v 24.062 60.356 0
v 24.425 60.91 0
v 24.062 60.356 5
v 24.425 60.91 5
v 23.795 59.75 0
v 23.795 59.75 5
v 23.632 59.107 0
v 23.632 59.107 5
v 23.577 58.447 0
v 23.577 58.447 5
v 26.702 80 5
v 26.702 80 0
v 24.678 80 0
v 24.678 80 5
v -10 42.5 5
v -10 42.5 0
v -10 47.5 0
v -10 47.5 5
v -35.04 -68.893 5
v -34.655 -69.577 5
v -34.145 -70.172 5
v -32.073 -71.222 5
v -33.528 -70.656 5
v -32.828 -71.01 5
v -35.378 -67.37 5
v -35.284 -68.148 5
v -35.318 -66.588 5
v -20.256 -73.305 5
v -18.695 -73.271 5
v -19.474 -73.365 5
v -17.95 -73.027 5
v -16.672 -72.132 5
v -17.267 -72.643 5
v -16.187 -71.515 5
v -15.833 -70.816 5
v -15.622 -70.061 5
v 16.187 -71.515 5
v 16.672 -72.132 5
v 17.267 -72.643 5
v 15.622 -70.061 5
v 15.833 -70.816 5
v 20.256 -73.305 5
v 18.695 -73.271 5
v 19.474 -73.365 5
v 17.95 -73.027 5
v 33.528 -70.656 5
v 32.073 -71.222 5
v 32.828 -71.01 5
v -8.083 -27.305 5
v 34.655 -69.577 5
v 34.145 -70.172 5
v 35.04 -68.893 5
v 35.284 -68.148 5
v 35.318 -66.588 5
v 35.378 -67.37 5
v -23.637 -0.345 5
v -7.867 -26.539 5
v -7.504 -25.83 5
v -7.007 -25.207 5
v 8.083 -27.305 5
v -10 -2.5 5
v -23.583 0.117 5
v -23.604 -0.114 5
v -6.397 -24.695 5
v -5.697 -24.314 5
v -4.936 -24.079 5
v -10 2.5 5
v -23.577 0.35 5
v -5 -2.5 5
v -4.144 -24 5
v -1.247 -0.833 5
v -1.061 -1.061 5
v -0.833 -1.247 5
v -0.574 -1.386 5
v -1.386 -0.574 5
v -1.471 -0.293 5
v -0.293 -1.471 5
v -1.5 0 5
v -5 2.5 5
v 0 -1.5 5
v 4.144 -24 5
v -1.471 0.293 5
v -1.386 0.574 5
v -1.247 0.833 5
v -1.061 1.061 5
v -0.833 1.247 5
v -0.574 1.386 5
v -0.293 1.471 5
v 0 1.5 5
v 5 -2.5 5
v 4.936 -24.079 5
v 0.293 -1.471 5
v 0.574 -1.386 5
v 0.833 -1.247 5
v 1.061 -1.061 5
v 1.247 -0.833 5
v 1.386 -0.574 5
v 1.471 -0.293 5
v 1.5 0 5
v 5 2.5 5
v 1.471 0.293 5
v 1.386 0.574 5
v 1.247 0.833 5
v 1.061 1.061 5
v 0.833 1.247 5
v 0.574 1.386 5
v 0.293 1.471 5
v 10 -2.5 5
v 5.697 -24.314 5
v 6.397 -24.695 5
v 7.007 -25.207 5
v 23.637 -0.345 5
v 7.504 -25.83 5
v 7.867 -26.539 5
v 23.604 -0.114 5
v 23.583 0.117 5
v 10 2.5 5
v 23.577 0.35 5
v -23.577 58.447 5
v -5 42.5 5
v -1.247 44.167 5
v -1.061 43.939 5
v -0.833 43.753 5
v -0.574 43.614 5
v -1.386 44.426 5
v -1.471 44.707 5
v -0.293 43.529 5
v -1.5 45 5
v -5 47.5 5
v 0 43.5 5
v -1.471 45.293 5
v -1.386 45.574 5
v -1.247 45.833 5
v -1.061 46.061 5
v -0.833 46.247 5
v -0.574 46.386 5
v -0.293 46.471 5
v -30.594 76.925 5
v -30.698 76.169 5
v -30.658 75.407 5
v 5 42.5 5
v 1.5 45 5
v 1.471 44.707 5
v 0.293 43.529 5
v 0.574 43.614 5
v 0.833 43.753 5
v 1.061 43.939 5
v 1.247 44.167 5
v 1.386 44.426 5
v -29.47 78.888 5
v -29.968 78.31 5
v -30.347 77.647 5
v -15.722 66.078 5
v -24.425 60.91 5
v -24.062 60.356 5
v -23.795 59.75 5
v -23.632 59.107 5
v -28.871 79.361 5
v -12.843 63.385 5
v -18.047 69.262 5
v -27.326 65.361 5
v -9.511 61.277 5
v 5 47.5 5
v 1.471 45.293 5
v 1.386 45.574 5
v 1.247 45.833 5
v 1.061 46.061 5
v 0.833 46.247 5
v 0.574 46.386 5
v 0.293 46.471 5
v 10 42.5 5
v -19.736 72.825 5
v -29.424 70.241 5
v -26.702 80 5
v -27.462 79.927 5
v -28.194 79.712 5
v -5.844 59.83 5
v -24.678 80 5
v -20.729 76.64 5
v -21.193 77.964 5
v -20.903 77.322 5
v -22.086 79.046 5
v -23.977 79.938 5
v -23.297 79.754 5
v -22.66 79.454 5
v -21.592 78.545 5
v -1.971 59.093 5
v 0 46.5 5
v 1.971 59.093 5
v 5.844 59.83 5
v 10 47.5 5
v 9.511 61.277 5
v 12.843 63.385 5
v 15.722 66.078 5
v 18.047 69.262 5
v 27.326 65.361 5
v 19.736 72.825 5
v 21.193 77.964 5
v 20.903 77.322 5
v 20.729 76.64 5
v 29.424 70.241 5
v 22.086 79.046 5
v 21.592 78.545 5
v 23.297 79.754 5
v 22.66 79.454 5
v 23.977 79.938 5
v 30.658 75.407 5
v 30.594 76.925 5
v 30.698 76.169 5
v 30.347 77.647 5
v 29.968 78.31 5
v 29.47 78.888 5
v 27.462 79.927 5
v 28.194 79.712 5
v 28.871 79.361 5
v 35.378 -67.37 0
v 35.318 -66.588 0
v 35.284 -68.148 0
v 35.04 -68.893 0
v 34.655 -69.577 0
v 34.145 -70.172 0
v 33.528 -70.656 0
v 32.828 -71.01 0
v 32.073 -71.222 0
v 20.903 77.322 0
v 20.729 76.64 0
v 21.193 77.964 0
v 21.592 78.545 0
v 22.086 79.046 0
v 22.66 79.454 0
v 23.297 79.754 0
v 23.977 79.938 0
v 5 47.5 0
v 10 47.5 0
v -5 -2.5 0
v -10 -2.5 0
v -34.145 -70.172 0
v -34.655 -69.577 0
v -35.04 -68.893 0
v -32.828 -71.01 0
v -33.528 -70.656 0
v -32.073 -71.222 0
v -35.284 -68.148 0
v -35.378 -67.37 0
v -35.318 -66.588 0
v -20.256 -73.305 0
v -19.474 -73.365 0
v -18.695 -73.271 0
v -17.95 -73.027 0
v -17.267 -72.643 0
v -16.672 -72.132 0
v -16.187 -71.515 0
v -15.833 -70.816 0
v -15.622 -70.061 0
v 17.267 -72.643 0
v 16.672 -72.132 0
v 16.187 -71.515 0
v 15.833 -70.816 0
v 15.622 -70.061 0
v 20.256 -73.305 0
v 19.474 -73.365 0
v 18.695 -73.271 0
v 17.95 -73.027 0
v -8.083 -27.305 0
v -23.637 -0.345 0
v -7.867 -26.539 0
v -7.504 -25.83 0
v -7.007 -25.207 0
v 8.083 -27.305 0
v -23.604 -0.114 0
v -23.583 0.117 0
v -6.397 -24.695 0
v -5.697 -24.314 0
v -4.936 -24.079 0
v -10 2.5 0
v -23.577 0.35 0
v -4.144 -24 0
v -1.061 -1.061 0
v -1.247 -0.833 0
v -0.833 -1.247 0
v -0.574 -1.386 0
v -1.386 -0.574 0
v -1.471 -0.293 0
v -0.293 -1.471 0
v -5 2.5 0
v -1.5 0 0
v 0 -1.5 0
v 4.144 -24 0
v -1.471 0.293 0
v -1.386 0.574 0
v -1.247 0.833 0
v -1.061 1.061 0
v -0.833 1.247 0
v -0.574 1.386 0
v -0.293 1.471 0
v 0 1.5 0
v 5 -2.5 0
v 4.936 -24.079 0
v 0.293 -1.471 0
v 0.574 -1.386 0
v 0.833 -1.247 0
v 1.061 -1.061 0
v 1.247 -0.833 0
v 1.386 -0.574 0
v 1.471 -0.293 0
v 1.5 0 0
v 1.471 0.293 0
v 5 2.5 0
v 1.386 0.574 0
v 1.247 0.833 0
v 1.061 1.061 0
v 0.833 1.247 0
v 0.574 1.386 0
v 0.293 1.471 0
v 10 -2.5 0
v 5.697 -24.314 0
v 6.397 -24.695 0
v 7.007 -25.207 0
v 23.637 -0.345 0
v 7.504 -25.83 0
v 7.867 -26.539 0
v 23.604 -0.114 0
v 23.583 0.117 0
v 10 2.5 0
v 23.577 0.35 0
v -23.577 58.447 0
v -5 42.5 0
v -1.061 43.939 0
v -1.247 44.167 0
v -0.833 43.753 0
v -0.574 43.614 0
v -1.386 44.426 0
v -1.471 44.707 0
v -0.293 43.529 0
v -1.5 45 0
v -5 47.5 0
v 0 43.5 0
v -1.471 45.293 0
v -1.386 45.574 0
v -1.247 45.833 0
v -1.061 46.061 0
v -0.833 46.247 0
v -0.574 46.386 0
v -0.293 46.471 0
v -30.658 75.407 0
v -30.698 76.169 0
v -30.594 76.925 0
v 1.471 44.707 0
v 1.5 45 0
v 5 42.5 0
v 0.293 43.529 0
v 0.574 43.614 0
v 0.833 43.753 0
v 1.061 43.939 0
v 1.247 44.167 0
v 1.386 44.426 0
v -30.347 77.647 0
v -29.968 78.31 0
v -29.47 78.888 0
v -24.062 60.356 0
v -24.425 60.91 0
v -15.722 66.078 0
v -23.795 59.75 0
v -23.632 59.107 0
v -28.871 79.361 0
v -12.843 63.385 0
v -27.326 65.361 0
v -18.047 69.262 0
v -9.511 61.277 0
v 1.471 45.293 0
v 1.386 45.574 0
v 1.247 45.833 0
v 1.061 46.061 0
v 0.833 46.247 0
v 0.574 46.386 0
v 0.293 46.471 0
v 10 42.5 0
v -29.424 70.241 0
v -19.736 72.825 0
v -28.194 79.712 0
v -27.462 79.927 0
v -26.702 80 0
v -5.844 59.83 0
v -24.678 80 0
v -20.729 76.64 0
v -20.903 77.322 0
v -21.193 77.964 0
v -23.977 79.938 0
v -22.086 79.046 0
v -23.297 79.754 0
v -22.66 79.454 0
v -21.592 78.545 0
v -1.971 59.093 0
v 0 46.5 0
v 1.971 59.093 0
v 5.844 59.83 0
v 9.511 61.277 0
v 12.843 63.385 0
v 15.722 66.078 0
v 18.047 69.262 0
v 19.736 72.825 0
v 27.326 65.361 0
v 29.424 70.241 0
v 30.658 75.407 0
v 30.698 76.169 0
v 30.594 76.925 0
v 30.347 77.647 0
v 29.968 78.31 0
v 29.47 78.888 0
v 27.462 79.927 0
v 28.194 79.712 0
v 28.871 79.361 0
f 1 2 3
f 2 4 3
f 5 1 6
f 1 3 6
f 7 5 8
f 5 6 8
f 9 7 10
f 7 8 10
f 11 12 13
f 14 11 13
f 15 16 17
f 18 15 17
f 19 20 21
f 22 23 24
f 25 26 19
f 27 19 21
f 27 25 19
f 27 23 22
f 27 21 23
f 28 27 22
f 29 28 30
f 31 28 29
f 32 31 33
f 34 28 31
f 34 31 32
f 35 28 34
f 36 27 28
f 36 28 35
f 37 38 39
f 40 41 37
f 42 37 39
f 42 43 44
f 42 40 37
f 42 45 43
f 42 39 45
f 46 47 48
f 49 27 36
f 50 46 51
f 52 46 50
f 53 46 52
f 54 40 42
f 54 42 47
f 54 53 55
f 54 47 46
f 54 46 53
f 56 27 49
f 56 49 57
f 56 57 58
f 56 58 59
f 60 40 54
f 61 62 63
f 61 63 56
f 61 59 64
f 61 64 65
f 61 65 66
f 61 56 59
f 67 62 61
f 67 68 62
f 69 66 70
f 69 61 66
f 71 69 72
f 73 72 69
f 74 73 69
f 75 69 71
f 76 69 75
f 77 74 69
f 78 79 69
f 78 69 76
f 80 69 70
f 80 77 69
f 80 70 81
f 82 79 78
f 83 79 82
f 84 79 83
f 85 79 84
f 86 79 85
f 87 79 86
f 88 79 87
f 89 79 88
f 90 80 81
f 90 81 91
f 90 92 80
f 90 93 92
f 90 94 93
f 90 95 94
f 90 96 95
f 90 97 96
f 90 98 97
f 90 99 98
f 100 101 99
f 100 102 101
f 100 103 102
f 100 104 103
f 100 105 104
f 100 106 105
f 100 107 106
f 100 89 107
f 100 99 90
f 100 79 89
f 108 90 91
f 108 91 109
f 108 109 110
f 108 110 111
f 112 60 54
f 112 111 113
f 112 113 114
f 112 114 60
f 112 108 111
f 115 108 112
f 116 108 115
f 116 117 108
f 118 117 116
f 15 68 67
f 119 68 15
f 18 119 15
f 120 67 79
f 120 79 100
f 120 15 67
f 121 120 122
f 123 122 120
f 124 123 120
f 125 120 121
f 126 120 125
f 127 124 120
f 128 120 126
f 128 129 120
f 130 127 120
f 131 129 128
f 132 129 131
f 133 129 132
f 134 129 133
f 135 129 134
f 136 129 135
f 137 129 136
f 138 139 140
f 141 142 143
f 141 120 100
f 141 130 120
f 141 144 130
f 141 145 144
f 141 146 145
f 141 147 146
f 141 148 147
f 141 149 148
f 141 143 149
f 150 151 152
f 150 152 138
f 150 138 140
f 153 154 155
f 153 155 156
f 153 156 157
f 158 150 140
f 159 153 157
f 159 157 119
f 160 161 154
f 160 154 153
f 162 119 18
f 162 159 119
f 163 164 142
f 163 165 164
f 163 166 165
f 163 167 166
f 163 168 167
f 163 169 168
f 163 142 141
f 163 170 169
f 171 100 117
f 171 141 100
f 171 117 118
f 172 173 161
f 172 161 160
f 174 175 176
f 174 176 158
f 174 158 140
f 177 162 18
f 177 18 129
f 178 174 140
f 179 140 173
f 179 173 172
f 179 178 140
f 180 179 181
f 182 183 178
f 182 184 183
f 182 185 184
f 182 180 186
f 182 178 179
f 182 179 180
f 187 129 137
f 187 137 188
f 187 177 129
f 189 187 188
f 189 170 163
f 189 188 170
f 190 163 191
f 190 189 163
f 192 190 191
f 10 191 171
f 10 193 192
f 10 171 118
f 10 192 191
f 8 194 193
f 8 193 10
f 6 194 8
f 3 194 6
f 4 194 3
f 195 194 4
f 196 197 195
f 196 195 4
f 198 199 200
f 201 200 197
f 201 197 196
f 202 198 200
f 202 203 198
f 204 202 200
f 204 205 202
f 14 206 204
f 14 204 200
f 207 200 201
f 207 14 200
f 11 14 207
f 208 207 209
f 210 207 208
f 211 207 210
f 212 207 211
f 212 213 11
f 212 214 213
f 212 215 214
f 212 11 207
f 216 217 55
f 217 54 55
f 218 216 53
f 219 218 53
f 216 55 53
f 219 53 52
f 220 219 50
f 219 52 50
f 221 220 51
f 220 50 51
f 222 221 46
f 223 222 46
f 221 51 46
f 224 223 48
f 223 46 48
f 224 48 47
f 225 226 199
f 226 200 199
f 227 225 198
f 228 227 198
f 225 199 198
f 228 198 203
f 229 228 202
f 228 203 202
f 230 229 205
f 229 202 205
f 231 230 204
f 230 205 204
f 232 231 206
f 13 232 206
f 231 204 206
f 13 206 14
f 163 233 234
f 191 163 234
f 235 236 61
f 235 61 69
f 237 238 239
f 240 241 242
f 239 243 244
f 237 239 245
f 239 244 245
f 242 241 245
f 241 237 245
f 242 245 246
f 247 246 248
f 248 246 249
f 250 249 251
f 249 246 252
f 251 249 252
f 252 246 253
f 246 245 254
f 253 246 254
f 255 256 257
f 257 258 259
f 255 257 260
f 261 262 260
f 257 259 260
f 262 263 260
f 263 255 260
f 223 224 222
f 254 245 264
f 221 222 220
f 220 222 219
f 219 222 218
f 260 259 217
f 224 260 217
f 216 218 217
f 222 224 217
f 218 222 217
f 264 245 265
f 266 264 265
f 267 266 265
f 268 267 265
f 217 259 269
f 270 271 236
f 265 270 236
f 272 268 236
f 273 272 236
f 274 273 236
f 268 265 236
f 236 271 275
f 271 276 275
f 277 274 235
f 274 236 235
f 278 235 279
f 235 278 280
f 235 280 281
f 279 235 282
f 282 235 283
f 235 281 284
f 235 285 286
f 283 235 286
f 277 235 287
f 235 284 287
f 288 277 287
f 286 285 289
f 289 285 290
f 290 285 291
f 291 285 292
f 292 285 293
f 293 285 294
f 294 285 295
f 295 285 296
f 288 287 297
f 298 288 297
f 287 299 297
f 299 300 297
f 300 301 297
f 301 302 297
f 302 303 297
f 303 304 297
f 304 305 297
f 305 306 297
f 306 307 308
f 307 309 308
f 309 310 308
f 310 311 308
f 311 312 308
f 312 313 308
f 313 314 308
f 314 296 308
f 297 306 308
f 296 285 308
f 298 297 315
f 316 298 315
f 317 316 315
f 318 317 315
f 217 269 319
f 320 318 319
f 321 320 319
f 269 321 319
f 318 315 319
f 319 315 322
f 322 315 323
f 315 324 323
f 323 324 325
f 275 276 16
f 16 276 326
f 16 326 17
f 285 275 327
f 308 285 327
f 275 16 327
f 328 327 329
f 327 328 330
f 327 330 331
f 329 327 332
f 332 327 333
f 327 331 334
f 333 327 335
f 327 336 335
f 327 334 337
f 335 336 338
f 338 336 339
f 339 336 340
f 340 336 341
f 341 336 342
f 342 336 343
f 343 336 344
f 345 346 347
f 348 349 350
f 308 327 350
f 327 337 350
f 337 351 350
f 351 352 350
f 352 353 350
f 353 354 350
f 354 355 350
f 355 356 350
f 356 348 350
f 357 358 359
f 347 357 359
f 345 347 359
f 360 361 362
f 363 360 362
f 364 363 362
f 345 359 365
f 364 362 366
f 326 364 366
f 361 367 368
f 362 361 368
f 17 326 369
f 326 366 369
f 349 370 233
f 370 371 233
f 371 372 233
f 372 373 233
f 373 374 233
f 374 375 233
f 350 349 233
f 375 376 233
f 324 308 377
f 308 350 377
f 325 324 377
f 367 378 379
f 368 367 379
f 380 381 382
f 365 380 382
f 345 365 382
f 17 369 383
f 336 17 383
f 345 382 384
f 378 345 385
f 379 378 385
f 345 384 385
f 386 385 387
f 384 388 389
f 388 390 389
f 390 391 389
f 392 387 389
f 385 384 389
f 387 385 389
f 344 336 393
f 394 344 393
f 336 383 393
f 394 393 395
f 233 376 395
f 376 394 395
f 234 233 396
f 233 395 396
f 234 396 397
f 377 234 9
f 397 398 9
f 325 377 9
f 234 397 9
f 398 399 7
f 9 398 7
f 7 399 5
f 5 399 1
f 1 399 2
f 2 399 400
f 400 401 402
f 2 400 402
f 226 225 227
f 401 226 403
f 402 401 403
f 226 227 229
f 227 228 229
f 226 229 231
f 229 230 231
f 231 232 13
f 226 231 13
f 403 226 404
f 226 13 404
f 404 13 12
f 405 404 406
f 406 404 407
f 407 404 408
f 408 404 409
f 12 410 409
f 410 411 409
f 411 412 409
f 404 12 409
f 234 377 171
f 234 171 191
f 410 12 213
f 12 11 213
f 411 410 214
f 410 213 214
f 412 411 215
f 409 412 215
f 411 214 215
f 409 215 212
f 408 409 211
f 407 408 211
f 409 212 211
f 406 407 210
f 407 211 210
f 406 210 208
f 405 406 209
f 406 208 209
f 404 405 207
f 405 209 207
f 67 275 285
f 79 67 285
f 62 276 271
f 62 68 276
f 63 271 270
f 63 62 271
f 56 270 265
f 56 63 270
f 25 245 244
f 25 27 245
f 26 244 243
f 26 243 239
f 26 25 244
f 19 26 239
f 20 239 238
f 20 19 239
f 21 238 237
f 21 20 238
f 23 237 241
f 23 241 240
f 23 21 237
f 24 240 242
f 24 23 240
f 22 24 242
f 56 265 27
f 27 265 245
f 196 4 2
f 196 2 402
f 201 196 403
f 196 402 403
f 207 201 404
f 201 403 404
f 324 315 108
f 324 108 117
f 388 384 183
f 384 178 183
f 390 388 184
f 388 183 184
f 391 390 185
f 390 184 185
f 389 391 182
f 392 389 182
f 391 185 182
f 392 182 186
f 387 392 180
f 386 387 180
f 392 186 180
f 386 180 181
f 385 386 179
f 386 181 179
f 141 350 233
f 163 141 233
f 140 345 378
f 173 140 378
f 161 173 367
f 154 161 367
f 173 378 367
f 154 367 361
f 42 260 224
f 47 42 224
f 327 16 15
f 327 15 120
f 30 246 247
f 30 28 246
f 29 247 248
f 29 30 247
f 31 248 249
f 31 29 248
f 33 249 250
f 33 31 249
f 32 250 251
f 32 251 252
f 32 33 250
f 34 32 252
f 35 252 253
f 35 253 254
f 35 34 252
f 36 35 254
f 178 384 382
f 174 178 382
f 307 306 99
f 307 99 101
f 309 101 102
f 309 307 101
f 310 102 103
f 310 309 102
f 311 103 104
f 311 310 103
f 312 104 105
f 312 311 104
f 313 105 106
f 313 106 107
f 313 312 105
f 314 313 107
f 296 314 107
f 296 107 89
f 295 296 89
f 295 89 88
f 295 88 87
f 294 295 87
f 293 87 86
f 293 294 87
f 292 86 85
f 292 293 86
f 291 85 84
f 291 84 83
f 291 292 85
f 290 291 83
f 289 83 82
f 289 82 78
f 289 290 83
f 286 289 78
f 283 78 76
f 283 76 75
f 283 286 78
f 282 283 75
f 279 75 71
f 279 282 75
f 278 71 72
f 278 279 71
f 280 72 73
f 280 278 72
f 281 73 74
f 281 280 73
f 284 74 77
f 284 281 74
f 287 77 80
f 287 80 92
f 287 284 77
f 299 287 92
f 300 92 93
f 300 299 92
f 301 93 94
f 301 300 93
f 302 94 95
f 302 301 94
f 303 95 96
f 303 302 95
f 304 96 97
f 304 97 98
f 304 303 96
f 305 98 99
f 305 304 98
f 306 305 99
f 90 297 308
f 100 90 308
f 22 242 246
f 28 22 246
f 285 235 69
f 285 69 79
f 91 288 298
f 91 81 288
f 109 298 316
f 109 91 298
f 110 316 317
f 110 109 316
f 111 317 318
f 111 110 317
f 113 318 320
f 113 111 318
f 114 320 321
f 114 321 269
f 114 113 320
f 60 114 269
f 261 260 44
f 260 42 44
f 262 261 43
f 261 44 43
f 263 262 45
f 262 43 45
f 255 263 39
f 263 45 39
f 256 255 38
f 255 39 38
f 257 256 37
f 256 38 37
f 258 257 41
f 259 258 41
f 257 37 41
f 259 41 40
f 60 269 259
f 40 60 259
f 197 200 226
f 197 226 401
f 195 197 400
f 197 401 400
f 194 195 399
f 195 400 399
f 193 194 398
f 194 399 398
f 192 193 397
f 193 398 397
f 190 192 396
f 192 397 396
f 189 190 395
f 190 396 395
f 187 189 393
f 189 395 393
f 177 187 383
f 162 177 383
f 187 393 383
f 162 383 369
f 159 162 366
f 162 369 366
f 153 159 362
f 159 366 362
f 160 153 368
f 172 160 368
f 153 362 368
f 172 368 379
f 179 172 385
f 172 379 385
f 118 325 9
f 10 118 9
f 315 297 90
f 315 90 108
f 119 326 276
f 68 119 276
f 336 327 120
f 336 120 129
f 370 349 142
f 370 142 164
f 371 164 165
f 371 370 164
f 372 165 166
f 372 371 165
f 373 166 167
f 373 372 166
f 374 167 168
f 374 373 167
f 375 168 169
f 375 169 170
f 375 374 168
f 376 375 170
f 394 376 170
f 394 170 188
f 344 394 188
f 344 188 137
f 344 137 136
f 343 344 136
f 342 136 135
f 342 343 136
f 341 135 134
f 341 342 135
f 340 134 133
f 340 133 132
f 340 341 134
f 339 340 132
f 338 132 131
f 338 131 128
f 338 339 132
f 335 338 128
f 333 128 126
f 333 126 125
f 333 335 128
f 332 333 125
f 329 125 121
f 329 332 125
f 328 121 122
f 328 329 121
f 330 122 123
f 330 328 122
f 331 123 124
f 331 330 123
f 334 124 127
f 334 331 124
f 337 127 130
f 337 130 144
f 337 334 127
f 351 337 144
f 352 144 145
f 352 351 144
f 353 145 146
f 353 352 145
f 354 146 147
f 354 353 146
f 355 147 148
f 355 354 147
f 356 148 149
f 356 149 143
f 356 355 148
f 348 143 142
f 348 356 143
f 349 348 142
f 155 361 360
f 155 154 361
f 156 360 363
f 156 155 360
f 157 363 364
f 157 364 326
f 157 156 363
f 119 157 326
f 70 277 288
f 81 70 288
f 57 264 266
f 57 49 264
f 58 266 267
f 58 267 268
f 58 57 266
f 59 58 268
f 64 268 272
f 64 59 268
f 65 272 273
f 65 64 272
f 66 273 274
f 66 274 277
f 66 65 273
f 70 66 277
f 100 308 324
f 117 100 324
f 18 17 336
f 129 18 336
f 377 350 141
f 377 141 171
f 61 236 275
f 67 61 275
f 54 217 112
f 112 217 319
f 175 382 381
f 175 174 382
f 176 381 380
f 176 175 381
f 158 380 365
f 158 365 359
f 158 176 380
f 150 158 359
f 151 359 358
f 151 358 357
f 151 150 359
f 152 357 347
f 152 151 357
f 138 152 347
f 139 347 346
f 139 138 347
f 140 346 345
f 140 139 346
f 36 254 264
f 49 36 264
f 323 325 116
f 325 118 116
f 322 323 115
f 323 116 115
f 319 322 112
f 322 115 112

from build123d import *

# Parameters (mm, degrees)
SKETCH1_R           = 1.5
SKETCH1_W           = 5
SKETCH1_H           = 5
BOSS_EXTRUDE1_DEPTH = 5
FILLET1_R           = 4


with BuildPart() as part:
    # Sketch1 → Boss-Extrude1 (new body)
    with BuildSketch(Plane.XY):
        with BuildLine():
            Line((-21, 80), (-31, 80))
            ThreePointArc((-31, 80), (-29.085023859, 69.273332897), (-23.576684701, 59.871911702))
            Line((-23.576684701, 59.871911702), (-23.576684701, 0))
            Line((-23.576684701, 0), (-36.012504096, -70.527036447))
            Line((-36.012504096, -70.527036447), (-16.316349035, -74))
            Line((-16.316349035, -74), (-7.5, -24))
            Line((-7.5, -24), (7.5, -24))
            Line((7.5, -24), (16.316349035, -74))
            Line((16.316349035, -74), (36.012504096, -70.527036447))
            Line((36.012504096, -70.527036447), (23.576684701, 0))
            Line((23.576684701, 0), (23.576684701, 59.871911702))
            ThreePointArc((23.576684701, 59.871911702), (29.085023859, 69.273332897), (31, 80))
            Line((31, 80), (21, 80))
            ThreePointArc((21, 80), (0, 59), (-21, 80))
        make_face()
        Circle(SKETCH1_R, mode=Mode.SUBTRACT)
        with Locations((0, 45)):
            Circle(SKETCH1_R, mode=Mode.SUBTRACT)
        with Locations((-7.5, 0)):
            Rectangle(SKETCH1_W, SKETCH1_H, mode=Mode.SUBTRACT)
        with Locations((7.5, 0)):
            Rectangle(SKETCH1_W, SKETCH1_H, mode=Mode.SUBTRACT)
        with Locations((-7.5, 45)):
            Rectangle(SKETCH1_W, SKETCH1_H, mode=Mode.SUBTRACT)
        with Locations((7.5, 45)):
            Rectangle(SKETCH1_W, SKETCH1_H, mode=Mode.SUBTRACT)
    extrude(amount=BOSS_EXTRUDE1_DEPTH)

    # Fillet1
    fillet1_edges = [part.edges().sort_by_distance(p)[0] for p in [
        (21, 80, 2.5),
        (31, 80, 2.5),
        (23.576684701, 59.871911702, 2.5),
        (23.576684701, 0, 2.5),
        (36.012504096, -70.527036447, 2.5),
        (16.316349035, -74, 2.5),
        (7.5, -24, 2.5),
        (-7.5, -24, 2.5),
        (-16.316349035, -74, 2.5),
        (-36.012504096, -70.527036447, 2.5),
        (-23.576684701, 0, 2.5),
        (-23.576684701, 59.871911702, 2.5),
        (-31, 80, 2.5),
        (-21, 80, 2.5),
    ]]
    fillet(fillet1_edges, radius=FILLET1_R)


solid = part.part
